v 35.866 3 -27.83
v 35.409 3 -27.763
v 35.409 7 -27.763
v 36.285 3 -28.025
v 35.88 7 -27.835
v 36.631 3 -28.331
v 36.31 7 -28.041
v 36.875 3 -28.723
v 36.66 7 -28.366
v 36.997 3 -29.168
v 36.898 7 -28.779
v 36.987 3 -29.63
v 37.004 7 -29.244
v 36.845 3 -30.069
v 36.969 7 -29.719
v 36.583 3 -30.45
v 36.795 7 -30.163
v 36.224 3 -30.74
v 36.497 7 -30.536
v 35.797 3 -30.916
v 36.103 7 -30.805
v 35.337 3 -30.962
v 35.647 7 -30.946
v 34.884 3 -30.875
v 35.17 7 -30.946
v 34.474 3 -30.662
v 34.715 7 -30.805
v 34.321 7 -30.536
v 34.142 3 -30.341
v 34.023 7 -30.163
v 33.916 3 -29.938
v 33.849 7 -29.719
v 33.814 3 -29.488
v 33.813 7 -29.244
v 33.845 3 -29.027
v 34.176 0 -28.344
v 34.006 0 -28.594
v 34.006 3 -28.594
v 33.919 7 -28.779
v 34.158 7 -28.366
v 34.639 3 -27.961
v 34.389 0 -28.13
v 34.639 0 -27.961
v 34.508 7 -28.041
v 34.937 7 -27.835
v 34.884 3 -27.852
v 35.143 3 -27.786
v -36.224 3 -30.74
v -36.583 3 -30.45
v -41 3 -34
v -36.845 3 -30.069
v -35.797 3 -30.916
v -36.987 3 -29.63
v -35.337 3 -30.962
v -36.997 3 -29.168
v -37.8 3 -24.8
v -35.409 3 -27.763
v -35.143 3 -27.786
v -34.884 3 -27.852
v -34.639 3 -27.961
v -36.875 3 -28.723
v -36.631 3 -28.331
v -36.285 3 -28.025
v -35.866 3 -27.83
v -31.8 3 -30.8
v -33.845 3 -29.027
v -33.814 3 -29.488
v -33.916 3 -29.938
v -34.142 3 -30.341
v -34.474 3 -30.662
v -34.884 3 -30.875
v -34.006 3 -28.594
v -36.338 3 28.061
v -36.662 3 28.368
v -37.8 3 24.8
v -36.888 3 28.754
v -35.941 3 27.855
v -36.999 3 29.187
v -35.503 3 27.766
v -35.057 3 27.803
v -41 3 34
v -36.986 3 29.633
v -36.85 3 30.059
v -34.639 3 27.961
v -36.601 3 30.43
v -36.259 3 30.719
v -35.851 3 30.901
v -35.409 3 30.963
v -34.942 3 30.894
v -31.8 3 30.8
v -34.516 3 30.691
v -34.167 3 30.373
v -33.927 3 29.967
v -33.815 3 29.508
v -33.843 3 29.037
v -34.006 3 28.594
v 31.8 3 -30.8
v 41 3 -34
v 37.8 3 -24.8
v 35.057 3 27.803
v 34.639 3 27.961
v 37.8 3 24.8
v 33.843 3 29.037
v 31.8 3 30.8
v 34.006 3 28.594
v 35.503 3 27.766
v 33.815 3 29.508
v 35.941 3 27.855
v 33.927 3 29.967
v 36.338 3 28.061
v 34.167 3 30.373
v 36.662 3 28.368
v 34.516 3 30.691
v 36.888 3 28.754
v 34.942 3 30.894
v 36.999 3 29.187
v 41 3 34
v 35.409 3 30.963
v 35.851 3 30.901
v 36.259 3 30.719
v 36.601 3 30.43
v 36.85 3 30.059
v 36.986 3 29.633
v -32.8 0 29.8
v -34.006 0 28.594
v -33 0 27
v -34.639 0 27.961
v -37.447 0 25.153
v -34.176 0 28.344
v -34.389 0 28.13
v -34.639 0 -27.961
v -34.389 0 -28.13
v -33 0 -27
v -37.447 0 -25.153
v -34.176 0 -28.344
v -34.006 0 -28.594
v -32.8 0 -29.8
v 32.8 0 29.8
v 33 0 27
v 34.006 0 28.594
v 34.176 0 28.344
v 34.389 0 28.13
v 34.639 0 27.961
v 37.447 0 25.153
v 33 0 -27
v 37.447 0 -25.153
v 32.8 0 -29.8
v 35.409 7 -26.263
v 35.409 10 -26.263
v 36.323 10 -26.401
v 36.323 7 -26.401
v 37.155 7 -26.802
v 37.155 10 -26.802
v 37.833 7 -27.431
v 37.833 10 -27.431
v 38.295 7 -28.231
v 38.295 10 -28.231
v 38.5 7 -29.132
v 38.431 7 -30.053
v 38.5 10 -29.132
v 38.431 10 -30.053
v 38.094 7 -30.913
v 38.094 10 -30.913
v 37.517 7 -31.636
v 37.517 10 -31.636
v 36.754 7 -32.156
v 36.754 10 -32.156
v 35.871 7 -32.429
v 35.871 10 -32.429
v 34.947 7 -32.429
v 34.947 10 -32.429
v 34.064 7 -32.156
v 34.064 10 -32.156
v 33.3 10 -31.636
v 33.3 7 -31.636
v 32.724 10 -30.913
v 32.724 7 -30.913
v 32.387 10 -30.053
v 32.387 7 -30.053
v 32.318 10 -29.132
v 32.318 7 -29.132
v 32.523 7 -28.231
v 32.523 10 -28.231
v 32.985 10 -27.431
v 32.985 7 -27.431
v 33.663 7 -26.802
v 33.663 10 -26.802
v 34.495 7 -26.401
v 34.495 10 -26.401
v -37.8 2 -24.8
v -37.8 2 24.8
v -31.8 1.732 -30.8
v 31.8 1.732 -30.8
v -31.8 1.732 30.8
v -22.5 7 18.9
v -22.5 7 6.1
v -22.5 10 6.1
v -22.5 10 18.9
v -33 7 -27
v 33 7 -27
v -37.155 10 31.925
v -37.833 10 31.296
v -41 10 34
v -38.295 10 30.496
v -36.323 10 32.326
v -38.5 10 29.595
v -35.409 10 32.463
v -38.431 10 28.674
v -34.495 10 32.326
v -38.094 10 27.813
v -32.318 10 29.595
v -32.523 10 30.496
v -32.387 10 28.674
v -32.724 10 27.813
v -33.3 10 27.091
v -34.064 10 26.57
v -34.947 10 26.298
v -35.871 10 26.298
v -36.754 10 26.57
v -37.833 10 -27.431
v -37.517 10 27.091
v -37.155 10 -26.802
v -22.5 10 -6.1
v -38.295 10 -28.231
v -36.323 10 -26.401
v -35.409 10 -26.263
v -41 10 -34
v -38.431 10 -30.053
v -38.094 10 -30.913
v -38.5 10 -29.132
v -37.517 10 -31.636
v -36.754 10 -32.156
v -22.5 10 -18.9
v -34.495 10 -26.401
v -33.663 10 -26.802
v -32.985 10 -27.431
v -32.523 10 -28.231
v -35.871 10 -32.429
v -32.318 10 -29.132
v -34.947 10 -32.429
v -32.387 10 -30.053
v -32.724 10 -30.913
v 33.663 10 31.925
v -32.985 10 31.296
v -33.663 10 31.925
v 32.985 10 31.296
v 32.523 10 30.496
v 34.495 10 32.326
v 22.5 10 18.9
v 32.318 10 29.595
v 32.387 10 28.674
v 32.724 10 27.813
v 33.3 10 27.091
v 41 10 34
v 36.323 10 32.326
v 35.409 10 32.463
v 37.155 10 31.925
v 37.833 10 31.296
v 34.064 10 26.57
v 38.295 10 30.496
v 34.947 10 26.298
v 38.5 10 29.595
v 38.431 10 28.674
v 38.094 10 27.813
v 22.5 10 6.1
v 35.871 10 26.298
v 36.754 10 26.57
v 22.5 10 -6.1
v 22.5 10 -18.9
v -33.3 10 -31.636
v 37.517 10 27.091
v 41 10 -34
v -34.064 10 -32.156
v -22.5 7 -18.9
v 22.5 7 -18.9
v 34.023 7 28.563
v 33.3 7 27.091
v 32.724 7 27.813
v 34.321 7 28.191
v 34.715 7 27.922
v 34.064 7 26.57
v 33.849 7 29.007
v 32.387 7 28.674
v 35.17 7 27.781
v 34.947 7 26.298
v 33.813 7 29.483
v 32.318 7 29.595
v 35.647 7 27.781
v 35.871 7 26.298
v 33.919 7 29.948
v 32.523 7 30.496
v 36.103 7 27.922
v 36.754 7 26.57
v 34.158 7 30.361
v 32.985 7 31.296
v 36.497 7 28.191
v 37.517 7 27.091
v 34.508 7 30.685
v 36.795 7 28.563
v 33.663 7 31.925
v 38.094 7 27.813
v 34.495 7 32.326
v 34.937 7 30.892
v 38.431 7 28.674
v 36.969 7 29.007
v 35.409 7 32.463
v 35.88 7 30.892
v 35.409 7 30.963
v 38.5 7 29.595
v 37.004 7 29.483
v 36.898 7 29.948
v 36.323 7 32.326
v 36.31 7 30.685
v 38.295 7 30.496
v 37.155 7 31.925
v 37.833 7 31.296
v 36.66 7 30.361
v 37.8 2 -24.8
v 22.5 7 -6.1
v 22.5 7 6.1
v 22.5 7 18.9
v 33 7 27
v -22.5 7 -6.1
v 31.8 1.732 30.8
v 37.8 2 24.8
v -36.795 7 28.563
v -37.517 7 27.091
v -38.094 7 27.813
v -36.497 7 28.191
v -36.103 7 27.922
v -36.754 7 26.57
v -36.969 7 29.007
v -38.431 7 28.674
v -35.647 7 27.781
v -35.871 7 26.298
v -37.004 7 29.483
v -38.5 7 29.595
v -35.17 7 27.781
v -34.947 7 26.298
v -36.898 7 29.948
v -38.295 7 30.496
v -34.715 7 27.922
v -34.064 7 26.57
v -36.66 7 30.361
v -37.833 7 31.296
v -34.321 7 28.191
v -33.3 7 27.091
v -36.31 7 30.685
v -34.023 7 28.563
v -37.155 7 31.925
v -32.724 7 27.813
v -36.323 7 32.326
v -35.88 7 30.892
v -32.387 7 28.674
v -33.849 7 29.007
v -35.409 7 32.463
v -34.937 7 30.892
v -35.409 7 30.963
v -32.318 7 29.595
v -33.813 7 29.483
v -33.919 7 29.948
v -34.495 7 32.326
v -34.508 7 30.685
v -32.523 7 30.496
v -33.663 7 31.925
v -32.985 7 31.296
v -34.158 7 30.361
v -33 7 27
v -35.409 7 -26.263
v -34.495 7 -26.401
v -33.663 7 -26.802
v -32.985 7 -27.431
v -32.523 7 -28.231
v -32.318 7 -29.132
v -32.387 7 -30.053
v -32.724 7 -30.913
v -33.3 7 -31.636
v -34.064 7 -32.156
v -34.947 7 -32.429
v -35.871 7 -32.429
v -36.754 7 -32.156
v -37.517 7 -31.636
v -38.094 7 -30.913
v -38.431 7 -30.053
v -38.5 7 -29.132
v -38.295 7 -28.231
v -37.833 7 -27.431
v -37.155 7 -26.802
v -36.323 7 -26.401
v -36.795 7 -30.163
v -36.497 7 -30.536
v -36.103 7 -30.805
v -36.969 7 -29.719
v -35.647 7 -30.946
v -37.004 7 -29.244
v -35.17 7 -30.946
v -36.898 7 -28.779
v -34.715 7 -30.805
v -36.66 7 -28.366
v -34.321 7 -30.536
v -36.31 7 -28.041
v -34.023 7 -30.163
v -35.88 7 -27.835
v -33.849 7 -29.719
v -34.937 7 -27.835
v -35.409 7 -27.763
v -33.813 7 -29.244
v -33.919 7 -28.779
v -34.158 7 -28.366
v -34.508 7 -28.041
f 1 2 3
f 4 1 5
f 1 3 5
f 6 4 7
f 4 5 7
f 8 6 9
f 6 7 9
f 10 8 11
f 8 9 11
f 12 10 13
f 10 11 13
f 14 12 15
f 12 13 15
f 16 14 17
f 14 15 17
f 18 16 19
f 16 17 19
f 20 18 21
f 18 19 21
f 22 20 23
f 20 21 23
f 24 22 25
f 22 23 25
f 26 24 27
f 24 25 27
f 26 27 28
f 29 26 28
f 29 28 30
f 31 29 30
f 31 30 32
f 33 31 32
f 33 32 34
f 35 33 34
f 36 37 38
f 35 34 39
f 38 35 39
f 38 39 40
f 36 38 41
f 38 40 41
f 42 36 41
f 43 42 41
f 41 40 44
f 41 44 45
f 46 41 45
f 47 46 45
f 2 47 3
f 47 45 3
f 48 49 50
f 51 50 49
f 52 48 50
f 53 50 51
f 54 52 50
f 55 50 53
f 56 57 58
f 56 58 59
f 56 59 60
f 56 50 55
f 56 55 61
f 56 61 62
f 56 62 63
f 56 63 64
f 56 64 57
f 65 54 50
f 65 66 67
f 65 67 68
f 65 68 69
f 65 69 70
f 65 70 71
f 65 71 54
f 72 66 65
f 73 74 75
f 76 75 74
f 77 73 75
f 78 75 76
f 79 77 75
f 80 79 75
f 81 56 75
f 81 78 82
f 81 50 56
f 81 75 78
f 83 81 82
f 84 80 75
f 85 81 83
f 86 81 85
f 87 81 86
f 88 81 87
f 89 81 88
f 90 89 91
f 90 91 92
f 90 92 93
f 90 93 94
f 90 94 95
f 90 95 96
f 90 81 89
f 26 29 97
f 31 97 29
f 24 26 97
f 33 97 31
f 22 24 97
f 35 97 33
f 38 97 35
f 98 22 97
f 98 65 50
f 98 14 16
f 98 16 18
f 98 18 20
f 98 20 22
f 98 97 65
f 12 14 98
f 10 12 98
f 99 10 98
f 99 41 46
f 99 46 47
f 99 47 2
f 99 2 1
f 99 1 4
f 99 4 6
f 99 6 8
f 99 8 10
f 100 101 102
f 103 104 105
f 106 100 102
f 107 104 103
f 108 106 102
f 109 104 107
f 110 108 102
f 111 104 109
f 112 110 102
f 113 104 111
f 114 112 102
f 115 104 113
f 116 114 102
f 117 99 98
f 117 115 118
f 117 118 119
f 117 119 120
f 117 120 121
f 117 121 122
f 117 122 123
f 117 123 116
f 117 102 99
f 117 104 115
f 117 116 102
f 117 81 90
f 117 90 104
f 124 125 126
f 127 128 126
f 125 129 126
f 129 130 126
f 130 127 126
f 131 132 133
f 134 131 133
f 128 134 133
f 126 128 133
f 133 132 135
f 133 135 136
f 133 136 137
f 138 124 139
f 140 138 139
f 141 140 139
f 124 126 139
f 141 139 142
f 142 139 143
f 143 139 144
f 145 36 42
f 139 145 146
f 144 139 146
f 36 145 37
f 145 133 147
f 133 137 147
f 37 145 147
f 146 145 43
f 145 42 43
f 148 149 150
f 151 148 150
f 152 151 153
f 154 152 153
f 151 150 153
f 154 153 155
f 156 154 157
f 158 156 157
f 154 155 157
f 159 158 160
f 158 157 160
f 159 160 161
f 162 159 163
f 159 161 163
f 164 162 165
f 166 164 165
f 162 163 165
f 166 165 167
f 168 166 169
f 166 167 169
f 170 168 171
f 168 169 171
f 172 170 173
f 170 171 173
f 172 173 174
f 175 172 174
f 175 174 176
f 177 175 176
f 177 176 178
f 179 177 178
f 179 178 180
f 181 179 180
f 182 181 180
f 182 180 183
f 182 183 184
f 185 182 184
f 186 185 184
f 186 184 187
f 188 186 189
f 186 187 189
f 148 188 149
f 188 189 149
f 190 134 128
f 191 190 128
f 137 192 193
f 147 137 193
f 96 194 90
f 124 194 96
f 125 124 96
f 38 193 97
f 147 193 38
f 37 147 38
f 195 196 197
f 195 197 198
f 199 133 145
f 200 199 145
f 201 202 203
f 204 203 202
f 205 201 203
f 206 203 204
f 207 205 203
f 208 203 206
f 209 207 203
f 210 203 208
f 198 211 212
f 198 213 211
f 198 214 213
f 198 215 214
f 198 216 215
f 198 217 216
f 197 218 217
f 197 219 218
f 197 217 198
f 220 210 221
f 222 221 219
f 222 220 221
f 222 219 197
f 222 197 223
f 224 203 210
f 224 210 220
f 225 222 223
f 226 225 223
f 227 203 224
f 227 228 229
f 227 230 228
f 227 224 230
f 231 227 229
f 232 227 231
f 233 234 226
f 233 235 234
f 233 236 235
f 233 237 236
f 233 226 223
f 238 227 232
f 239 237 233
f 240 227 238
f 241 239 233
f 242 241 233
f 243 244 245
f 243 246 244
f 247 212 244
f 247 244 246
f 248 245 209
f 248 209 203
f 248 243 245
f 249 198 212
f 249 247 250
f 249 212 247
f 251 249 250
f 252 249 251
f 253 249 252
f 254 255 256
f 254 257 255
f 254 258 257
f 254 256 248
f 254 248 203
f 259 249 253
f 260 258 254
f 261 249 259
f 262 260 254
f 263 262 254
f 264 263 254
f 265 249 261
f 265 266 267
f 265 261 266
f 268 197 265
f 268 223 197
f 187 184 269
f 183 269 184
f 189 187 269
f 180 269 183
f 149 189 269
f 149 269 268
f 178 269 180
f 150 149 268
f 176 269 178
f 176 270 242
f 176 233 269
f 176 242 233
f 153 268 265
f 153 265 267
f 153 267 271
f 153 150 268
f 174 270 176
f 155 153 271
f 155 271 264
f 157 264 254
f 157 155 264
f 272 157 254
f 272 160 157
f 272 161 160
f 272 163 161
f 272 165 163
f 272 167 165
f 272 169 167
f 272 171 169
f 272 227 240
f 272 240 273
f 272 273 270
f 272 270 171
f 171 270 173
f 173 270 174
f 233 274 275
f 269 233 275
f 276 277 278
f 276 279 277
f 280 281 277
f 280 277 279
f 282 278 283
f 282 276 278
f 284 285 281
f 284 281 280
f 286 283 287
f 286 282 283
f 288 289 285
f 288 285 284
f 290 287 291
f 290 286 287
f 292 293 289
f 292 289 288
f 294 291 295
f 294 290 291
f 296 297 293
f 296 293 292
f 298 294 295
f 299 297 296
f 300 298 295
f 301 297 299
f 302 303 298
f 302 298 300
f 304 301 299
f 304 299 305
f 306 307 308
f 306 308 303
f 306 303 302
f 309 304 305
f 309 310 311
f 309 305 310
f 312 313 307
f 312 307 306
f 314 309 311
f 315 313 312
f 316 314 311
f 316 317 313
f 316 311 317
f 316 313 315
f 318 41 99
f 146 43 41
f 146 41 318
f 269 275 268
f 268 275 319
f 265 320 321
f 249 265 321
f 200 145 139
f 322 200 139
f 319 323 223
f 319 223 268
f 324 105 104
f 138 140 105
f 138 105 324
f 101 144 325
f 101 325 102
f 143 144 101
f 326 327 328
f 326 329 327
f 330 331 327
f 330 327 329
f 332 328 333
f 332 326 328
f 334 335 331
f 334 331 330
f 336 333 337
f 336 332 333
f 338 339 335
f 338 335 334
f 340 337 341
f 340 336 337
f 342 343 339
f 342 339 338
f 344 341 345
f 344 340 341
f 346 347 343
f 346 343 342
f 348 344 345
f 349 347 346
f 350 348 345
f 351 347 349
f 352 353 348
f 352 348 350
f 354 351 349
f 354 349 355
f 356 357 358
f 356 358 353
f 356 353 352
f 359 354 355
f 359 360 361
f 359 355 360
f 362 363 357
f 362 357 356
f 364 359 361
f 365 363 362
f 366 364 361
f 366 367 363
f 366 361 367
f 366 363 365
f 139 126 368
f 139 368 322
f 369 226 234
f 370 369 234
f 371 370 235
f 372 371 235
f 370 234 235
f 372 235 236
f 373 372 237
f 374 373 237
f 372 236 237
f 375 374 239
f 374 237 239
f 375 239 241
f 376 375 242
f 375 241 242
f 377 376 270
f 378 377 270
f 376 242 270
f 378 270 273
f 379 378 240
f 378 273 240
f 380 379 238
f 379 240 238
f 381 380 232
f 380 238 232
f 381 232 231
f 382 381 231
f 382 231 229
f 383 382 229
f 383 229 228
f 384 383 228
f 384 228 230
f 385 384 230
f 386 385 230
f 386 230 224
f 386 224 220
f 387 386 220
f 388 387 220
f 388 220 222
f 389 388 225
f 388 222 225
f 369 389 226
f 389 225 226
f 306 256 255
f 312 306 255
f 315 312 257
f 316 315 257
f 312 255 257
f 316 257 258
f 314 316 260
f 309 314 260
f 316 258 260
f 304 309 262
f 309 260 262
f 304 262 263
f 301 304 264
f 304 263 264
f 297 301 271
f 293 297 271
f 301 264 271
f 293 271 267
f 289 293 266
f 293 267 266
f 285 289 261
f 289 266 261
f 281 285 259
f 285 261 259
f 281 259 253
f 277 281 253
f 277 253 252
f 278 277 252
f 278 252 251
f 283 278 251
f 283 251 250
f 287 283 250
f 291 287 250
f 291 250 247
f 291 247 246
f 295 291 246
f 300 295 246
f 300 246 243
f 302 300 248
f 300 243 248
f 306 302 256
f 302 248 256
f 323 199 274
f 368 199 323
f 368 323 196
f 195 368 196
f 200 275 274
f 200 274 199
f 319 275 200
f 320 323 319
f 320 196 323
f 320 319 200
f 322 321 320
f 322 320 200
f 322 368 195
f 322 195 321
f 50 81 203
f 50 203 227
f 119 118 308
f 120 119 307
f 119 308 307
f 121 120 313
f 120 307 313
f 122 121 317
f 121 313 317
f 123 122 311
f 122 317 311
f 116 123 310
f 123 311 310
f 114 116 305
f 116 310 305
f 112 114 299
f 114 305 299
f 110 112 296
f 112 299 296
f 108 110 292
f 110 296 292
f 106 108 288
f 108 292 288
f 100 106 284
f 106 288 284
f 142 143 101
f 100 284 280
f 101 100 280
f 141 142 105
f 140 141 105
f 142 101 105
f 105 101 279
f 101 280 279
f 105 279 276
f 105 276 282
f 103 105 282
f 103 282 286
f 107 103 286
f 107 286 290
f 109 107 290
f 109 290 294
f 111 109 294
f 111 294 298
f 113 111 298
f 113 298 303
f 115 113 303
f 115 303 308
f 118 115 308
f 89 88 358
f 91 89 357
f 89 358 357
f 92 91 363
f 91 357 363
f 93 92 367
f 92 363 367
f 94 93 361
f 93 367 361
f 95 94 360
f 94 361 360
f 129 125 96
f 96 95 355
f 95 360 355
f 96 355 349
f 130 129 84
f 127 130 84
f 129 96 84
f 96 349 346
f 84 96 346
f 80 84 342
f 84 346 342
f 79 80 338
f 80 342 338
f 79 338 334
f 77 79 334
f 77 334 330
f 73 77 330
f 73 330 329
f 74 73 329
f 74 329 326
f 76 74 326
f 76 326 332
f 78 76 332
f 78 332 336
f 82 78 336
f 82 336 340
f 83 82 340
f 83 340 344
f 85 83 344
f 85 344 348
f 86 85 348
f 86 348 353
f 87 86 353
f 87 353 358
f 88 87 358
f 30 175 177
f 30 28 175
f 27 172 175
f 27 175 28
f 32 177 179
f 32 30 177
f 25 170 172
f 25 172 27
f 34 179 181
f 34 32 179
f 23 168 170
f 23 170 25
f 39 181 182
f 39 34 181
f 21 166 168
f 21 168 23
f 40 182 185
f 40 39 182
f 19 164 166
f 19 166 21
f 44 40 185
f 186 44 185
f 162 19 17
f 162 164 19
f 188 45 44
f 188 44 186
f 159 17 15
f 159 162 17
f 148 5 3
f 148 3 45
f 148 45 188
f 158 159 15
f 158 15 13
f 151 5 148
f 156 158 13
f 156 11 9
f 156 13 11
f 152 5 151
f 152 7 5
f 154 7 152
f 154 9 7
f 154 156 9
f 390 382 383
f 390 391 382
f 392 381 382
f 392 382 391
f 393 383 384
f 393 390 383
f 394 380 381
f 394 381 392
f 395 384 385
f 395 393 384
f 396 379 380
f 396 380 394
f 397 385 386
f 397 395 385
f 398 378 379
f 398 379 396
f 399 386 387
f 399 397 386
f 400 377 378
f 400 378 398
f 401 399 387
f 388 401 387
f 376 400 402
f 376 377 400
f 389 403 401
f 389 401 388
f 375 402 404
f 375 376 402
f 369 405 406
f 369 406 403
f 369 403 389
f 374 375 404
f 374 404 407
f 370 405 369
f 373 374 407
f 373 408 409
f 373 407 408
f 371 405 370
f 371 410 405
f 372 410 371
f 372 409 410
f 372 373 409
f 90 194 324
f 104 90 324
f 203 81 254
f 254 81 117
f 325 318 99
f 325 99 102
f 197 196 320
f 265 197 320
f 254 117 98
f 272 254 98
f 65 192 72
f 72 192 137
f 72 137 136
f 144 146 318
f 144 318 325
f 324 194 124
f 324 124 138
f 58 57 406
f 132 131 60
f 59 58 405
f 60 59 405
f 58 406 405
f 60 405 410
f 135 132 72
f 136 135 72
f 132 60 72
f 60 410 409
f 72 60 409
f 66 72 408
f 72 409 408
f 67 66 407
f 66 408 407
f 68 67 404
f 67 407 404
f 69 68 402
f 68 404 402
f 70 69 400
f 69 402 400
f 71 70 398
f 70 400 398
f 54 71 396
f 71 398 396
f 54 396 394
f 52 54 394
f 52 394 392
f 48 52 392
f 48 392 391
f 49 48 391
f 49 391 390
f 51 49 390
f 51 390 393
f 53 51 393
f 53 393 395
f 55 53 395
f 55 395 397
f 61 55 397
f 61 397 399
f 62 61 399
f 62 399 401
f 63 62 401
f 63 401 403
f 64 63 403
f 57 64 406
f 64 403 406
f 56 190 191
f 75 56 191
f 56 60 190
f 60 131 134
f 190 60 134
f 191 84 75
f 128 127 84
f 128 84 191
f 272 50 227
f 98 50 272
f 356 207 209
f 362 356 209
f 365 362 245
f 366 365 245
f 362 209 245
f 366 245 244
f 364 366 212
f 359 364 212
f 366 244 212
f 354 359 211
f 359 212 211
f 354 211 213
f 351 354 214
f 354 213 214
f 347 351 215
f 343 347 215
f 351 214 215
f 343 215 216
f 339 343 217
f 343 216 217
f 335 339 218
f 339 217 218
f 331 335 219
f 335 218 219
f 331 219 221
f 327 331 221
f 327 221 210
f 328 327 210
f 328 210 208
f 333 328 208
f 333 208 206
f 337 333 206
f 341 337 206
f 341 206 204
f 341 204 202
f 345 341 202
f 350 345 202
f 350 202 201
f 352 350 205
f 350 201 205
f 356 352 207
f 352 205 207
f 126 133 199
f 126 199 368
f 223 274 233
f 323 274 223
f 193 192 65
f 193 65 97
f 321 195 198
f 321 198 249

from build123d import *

# Parameters (mm, degrees)
SKETCH1_W             = 76
SKETCH1_H             = 62
BOSS_EXTRUDE1_DEPTH   = 2
SKETCH2_W             = 82
SKETCH2_H             = 68
BOSS_EXTRUDE2_DEPTH   = 8
SKETCH3_W             = 45
SKETCH3_H             = 12.8
CUT_EXTRUDE1_DEPTH    = 11
SKETCH4_R             = 1.6
CUT_EXTRUDE2_DEPTH    = 11
SKETCH5_R             = 3.1
CUT_EXTRUDE3_DEPTH    = 3
SKETCH9_OUTSIDE_W     = 105.4
SKETCH9_OUTSIDE_H     = 91.4
SKETCH9_OUTSIDE_W_2   = 75.6
SKETCH9_OUTSIDE_H_2   = 61.6
CUT_EXTRUDE5_DEPTH    = 3
CUT_EXTRUDE6_DEPTH    = 3
SKETCH11_W            = 66
SKETCH11_H            = 54
CUT_EXTRUDE7_DEPTH    = 7
CHAMFER2_SIZE         = 2
CHAMFER2_SIZE2        = 0.352653961
CHAMFER2_PART_2_SIZE  = 2
CHAMFER2_PART_2_SIZE2 = 0.352653961
CHAMFER3_SIZE         = 1
CHAMFER3_SIZE2        = 1.732050808


with BuildPart() as part:
    # Sketch1 → Boss-Extrude1 (new body)
    with BuildSketch(Plane(origin=(0, 0, 0), x_dir=(1, 0, 0), z_dir=(0, 1, 0))):
        Rectangle(SKETCH1_W, SKETCH1_H)
    extrude(amount=BOSS_EXTRUDE1_DEPTH)

    # Sketch2 → Boss-Extrude2 (add)
    with BuildSketch(Plane(origin=(0, 2, 0), x_dir=(1, 0, 0), z_dir=(0, 1, 0))):
        Rectangle(SKETCH2_W, SKETCH2_H)
    extrude(amount=BOSS_EXTRUDE2_DEPTH)

    # Sketch3 → Cut-Extrude1 (cut, through all)
    with BuildSketch(Plane.XZ):
        with Locations((0, -12.5)):
            Rectangle(SKETCH3_W, SKETCH3_H)
        with Locations((0, 12.5)):
            Rectangle(SKETCH3_W, SKETCH3_H)
    extrude(amount=-CUT_EXTRUDE1_DEPTH, mode=Mode.SUBTRACT)

    # Sketch4 → Cut-Extrude2 (cut, through all)
    with BuildSketch(Plane(origin=(0, 10, 0), x_dir=(1, 0, 0), z_dir=(0, 1, 0))):
        with Locations(Location((-35.408866178, 29.363450001, 0), (0, 0, 270))):  # turned: the seam where the file's is
            Circle(SKETCH4_R)
        with Locations(Location((35.408866178, 29.363450001, 0), (0, 0, 270))):  # turned: the seam where the file's is
            Circle(SKETCH4_R)
        with Locations(Location((35.408866178, -29.363450001, 0), (0, 0, 270))):  # turned: the seam where the file's is
            Circle(SKETCH4_R)
        with Locations(Location((-35.408866178, -29.363450001, 0), (0, 0, 270))):  # turned: the seam where the file's is
            Circle(SKETCH4_R)
    extrude(amount=-CUT_EXTRUDE2_DEPTH, mode=Mode.SUBTRACT)

    # Sketch5 → Cut-Extrude3 (cut)
    with BuildSketch(Plane(origin=(0, 10, 0), x_dir=(1, 0, 0), z_dir=(0, 1, 0))):
        with Locations(Location((-35.408866178, 29.363450001, 0), (0, 0, 270))):  # turned: the seam where the file's is
            Circle(SKETCH5_R)
        with Locations(Location((35.408866178, 29.363450001, 0), (0, 0, 270))):  # turned: the seam where the file's is
            Circle(SKETCH5_R)
        with Locations(Location((35.408866178, -29.363450001, 0), (0, 0, 270))):  # turned: the seam where the file's is
            Circle(SKETCH5_R)
        with Locations(Location((-35.408866178, -29.363450001, 0), (0, 0, 270))):  # turned: the seam where the file's is
            Circle(SKETCH5_R)
    extrude(amount=-CUT_EXTRUDE3_DEPTH, mode=Mode.SUBTRACT)

    # Sketch9 outside → Cut-Extrude5 (cut)
    with BuildSketch(Plane.XZ):
        Rectangle(SKETCH9_OUTSIDE_W, SKETCH9_OUTSIDE_H)
        Rectangle(SKETCH9_OUTSIDE_W_2, SKETCH9_OUTSIDE_H_2, mode=Mode.SUBTRACT)
    extrude(amount=-CUT_EXTRUDE5_DEPTH, mode=Mode.SUBTRACT)

    # Sketch10 → Cut-Extrude6 (cut)
    with BuildSketch(Plane.XZ):
        Polygon((-37.8, -30.8), (-31.8, -30.8), (-37.8, -24.8), align=None)
        Polygon((-37.8, 24.8), (-37.8, 30.8), (-31.8, 30.8), align=None)
        Polygon((37.8, 30.8), (37.8, 24.8), (31.8, 30.8), align=None)
        Polygon((37.8, -30.8), (31.8, -30.8), (37.8, -24.8), align=None)
    extrude(amount=-CUT_EXTRUDE6_DEPTH, mode=Mode.SUBTRACT)

    # Sketch11 → Cut-Extrude7 (cut)
    with BuildSketch(Plane.XZ):
        Rectangle(SKETCH11_W, SKETCH11_H)
    extrude(amount=-CUT_EXTRUDE7_DEPTH, mode=Mode.SUBTRACT)

    # Chamfer2
    chamfer2_edges = [part.edges().sort_by_distance(p)[0] for p in [
        (37.8, 0, 0),
    ]]
    chamfer2_side = [part.faces().sort_by_distance(p)[0] for p in [
        (37.8, 1.5, 0),
    ]]
    chamfer(chamfer2_edges, length=CHAMFER2_SIZE, length2=CHAMFER2_SIZE2, reference=chamfer2_side[0])

    # Chamfer2 part 2
    chamfer2_part_2_edges = [part.edges().sort_by_distance(p)[0] for p in [
        (-37.8, 0, 0),
    ]]
    chamfer2_part_2_side = [part.faces().sort_by_distance(p)[0] for p in [
        (-37.8, 1.5, 0),
    ]]
    chamfer(chamfer2_part_2_edges, length=CHAMFER2_PART_2_SIZE, length2=CHAMFER2_PART_2_SIZE2, reference=chamfer2_part_2_side[0])

    # Chamfer3
    chamfer3_edges = [part.edges().sort_by_distance(p)[0] for p in [
        (0, 0, -30.8),
        (0, 0, 30.8),
    ]]
    chamfer3_side = [part.faces().sort_by_distance(p)[0] for p in [
        (-35.357643735, 0, 25.870950059),
    ]]
    chamfer(chamfer3_edges, length=CHAMFER3_SIZE, length2=CHAMFER3_SIZE2, reference=chamfer3_side[0])


solid = part.part
